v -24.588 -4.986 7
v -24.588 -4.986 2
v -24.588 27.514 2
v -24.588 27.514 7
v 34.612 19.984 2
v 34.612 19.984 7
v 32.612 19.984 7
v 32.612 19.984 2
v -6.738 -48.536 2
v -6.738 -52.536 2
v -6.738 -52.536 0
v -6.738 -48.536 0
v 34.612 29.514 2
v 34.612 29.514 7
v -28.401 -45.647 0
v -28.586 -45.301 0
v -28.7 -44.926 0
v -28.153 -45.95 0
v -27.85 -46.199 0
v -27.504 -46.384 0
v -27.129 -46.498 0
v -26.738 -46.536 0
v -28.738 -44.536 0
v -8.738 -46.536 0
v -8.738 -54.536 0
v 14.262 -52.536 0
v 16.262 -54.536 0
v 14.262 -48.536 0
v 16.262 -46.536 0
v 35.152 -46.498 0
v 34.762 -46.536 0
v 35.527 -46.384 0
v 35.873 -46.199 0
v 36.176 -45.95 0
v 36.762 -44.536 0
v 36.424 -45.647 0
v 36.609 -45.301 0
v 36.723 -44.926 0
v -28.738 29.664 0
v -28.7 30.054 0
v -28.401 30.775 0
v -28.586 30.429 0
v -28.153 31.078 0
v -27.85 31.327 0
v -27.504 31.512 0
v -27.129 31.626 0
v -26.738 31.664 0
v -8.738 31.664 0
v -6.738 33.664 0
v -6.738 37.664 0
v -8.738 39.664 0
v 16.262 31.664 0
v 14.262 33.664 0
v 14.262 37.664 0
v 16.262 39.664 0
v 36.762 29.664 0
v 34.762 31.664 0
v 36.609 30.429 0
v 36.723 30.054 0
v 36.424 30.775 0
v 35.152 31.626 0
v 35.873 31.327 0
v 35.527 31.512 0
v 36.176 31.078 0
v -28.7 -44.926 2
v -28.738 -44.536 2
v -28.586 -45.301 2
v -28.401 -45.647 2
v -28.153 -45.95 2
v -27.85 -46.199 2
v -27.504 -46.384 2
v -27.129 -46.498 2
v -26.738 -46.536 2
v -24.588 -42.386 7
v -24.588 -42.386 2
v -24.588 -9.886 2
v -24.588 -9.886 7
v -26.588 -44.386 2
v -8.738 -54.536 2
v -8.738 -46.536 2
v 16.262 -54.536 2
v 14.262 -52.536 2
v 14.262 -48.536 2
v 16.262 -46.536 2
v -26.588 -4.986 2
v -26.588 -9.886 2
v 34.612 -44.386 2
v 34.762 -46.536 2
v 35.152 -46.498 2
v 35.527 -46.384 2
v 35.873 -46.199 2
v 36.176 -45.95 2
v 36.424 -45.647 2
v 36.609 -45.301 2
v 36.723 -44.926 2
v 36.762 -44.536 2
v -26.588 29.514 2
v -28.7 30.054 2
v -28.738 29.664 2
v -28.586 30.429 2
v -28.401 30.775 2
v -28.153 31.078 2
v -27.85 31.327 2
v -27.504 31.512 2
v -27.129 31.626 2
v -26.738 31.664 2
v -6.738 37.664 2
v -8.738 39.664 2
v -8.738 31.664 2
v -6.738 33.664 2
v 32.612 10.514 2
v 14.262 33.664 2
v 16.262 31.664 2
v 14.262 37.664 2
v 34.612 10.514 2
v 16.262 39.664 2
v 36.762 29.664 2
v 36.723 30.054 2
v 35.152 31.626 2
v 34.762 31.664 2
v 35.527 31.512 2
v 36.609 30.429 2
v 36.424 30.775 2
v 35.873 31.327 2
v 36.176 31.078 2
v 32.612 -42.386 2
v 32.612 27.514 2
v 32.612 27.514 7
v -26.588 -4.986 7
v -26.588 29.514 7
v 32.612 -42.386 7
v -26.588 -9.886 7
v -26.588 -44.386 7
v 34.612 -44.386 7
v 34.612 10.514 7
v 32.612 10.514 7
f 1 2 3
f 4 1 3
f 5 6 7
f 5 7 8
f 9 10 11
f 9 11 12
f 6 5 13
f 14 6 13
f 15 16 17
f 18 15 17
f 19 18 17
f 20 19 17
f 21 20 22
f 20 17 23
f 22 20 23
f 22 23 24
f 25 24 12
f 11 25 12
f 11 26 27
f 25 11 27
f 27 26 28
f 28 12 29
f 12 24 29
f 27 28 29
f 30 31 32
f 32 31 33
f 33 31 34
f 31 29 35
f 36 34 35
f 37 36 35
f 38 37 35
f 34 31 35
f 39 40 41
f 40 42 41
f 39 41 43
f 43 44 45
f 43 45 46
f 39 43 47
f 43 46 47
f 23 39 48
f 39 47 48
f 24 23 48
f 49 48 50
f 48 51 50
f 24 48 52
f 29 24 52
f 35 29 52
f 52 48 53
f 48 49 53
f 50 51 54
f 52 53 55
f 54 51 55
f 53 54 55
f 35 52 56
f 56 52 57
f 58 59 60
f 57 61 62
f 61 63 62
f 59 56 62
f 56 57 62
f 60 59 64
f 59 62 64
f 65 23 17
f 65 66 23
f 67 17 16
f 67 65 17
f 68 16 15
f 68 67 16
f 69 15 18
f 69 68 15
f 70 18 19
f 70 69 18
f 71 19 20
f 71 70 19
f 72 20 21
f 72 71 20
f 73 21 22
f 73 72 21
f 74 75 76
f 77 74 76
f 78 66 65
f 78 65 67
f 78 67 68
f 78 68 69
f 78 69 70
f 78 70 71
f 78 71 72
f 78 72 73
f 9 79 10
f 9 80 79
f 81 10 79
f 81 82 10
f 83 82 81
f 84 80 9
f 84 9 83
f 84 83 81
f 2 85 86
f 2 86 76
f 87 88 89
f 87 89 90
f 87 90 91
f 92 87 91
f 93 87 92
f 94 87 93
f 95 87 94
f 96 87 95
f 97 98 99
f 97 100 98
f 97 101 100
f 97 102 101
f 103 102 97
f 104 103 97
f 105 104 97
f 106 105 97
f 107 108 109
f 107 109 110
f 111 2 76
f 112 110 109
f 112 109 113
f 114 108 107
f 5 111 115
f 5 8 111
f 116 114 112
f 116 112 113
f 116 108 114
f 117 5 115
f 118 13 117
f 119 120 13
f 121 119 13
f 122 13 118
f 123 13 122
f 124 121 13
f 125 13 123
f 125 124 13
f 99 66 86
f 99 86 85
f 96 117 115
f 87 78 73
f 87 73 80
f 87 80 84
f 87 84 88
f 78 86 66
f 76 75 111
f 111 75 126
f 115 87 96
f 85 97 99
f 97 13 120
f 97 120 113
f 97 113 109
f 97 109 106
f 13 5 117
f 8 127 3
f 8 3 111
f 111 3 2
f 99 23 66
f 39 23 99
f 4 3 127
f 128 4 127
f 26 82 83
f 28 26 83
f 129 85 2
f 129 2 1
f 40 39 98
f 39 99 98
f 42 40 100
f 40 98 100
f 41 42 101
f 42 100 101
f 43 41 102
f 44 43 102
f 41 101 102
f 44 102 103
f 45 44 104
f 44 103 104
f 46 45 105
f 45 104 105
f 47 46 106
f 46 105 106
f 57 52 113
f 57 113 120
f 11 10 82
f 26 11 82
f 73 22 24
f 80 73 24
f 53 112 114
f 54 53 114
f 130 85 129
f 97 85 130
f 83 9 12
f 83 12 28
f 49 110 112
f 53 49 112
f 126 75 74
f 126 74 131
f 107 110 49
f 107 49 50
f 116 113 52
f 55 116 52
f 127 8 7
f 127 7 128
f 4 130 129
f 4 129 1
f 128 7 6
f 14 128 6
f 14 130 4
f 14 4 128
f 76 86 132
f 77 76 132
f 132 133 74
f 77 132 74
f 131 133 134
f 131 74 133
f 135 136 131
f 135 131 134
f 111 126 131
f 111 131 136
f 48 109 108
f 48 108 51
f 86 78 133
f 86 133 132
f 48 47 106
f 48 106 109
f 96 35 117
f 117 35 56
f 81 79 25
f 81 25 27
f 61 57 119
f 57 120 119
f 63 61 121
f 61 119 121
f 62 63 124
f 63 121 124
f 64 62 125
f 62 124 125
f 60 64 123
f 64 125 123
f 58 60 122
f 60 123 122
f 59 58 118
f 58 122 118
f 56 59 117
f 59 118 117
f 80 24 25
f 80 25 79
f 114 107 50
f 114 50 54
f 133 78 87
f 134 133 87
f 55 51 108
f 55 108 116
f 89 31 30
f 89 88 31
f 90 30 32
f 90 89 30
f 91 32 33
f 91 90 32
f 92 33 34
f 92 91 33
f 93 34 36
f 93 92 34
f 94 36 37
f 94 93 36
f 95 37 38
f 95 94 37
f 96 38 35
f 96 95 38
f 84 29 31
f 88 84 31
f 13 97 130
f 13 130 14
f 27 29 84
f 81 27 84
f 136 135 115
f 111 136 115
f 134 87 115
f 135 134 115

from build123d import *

# Parameters (mm, degrees)
SKETCH1_W           = 65.5
SKETCH1_H           = 78.2
BOSS_EXTRUDE1_DEPTH = 2
SKETCH2_W           = 61.2
SKETCH2_H           = 73.9
SKETCH2_W_2         = 57.2
SKETCH2_H_2         = 69.9
BOSS_EXTRUDE2_DEPTH = 5
SKETCH3_W           = 5
SKETCH3_H           = 9.47
CUT_EXTRUDE1_DEPTH  = 2
SKETCH4_W           = 5
SKETCH4_H           = 4.9
CUT_EXTRUDE2_DEPTH  = 2
FILLET1_R           = 2
SKETCH5_W           = 25
SKETCH5_H           = 2
BOSS_EXTRUDE3_DEPTH = 8
SKETCH6_W           = 25
SKETCH6_H           = 2
BOSS_EXTRUDE4_DEPTH = 8
SKETCH7_W           = 21
SKETCH7_H           = 4
CUT_EXTRUDE3_DEPTH  = 3


with BuildPart() as part:
    # Sketch1 → Boss-Extrude1 (new body)
    with BuildSketch(Plane.XY):
        with Locations((4.011517615, -7.43604336)):
            Rectangle(SKETCH1_W, SKETCH1_H)
    extrude(amount=BOSS_EXTRUDE1_DEPTH)

    # Sketch2 → Boss-Extrude2 (add)
    with BuildSketch(Plane.XY.offset(2)):
        with Locations((4.011517615, -7.43604336)):
            Rectangle(SKETCH2_W, SKETCH2_H)
        with Locations((4.011517615, -7.43604336)):
            Rectangle(SKETCH2_W_2, SKETCH2_H_2, mode=Mode.SUBTRACT)
    extrude(amount=BOSS_EXTRUDE2_DEPTH)

    # Sketch3 → Cut-Extrude1 (cut)
    with BuildSketch(Plane(origin=(34.611517615, 0, 0), x_dir=(0, 0, -1), z_dir=(1, 0, 0))):
        with Locations((-4.5, 15.24895664)):
            Rectangle(SKETCH3_W, SKETCH3_H)
    extrude(amount=-CUT_EXTRUDE1_DEPTH, mode=Mode.SUBTRACT)

    # Sketch4 → Cut-Extrude2 (cut)
    with BuildSketch(Plane.ZY.offset(26.588482385)):
        with Locations((4.5, -7.43604336)):
            Rectangle(SKETCH4_W, SKETCH4_H)
    extrude(amount=-CUT_EXTRUDE2_DEPTH, mode=Mode.SUBTRACT)

    # Fillet1
    fillet1_edges = [part.edges().sort_by_distance(p)[0] for p in [
        (-28.738482385, 31.66395664, 1),
        (36.761517615, 31.66395664, 1),
        (36.761517615, -46.53604336, 1),
        (-28.738482385, -46.53604336, 1),
    ]]
    fillet(fillet1_edges, radius=FILLET1_R)

    # Sketch5 → Boss-Extrude3 (add)
    with BuildSketch(Plane(origin=(0, 31.66395664, 0), x_dir=(1, 0, 0), z_dir=(0, 1, 0))):
        with Locations((3.761517615, -1)):
            Rectangle(SKETCH5_W, SKETCH5_H)
    extrude(amount=BOSS_EXTRUDE3_DEPTH)

    # Sketch6 → Boss-Extrude4 (add)
    with BuildSketch(Plane.XZ.offset(46.53604336)):
        with Locations((3.761517615, 1)):
            Rectangle(SKETCH6_W, SKETCH6_H)
    extrude(amount=BOSS_EXTRUDE4_DEPTH)

    # Sketch7 → Cut-Extrude3 (cut, through all)
    with BuildSketch(Plane.XY.offset(2)):
        with Locations((3.761517615, -50.53604336)):
            Rectangle(SKETCH7_W, SKETCH7_H)
        with Locations((3.761517615, 35.66395664)):
            Rectangle(SKETCH7_W, SKETCH7_H)
    extrude(amount=-CUT_EXTRUDE3_DEPTH, mode=Mode.SUBTRACT)


solid = part.part
